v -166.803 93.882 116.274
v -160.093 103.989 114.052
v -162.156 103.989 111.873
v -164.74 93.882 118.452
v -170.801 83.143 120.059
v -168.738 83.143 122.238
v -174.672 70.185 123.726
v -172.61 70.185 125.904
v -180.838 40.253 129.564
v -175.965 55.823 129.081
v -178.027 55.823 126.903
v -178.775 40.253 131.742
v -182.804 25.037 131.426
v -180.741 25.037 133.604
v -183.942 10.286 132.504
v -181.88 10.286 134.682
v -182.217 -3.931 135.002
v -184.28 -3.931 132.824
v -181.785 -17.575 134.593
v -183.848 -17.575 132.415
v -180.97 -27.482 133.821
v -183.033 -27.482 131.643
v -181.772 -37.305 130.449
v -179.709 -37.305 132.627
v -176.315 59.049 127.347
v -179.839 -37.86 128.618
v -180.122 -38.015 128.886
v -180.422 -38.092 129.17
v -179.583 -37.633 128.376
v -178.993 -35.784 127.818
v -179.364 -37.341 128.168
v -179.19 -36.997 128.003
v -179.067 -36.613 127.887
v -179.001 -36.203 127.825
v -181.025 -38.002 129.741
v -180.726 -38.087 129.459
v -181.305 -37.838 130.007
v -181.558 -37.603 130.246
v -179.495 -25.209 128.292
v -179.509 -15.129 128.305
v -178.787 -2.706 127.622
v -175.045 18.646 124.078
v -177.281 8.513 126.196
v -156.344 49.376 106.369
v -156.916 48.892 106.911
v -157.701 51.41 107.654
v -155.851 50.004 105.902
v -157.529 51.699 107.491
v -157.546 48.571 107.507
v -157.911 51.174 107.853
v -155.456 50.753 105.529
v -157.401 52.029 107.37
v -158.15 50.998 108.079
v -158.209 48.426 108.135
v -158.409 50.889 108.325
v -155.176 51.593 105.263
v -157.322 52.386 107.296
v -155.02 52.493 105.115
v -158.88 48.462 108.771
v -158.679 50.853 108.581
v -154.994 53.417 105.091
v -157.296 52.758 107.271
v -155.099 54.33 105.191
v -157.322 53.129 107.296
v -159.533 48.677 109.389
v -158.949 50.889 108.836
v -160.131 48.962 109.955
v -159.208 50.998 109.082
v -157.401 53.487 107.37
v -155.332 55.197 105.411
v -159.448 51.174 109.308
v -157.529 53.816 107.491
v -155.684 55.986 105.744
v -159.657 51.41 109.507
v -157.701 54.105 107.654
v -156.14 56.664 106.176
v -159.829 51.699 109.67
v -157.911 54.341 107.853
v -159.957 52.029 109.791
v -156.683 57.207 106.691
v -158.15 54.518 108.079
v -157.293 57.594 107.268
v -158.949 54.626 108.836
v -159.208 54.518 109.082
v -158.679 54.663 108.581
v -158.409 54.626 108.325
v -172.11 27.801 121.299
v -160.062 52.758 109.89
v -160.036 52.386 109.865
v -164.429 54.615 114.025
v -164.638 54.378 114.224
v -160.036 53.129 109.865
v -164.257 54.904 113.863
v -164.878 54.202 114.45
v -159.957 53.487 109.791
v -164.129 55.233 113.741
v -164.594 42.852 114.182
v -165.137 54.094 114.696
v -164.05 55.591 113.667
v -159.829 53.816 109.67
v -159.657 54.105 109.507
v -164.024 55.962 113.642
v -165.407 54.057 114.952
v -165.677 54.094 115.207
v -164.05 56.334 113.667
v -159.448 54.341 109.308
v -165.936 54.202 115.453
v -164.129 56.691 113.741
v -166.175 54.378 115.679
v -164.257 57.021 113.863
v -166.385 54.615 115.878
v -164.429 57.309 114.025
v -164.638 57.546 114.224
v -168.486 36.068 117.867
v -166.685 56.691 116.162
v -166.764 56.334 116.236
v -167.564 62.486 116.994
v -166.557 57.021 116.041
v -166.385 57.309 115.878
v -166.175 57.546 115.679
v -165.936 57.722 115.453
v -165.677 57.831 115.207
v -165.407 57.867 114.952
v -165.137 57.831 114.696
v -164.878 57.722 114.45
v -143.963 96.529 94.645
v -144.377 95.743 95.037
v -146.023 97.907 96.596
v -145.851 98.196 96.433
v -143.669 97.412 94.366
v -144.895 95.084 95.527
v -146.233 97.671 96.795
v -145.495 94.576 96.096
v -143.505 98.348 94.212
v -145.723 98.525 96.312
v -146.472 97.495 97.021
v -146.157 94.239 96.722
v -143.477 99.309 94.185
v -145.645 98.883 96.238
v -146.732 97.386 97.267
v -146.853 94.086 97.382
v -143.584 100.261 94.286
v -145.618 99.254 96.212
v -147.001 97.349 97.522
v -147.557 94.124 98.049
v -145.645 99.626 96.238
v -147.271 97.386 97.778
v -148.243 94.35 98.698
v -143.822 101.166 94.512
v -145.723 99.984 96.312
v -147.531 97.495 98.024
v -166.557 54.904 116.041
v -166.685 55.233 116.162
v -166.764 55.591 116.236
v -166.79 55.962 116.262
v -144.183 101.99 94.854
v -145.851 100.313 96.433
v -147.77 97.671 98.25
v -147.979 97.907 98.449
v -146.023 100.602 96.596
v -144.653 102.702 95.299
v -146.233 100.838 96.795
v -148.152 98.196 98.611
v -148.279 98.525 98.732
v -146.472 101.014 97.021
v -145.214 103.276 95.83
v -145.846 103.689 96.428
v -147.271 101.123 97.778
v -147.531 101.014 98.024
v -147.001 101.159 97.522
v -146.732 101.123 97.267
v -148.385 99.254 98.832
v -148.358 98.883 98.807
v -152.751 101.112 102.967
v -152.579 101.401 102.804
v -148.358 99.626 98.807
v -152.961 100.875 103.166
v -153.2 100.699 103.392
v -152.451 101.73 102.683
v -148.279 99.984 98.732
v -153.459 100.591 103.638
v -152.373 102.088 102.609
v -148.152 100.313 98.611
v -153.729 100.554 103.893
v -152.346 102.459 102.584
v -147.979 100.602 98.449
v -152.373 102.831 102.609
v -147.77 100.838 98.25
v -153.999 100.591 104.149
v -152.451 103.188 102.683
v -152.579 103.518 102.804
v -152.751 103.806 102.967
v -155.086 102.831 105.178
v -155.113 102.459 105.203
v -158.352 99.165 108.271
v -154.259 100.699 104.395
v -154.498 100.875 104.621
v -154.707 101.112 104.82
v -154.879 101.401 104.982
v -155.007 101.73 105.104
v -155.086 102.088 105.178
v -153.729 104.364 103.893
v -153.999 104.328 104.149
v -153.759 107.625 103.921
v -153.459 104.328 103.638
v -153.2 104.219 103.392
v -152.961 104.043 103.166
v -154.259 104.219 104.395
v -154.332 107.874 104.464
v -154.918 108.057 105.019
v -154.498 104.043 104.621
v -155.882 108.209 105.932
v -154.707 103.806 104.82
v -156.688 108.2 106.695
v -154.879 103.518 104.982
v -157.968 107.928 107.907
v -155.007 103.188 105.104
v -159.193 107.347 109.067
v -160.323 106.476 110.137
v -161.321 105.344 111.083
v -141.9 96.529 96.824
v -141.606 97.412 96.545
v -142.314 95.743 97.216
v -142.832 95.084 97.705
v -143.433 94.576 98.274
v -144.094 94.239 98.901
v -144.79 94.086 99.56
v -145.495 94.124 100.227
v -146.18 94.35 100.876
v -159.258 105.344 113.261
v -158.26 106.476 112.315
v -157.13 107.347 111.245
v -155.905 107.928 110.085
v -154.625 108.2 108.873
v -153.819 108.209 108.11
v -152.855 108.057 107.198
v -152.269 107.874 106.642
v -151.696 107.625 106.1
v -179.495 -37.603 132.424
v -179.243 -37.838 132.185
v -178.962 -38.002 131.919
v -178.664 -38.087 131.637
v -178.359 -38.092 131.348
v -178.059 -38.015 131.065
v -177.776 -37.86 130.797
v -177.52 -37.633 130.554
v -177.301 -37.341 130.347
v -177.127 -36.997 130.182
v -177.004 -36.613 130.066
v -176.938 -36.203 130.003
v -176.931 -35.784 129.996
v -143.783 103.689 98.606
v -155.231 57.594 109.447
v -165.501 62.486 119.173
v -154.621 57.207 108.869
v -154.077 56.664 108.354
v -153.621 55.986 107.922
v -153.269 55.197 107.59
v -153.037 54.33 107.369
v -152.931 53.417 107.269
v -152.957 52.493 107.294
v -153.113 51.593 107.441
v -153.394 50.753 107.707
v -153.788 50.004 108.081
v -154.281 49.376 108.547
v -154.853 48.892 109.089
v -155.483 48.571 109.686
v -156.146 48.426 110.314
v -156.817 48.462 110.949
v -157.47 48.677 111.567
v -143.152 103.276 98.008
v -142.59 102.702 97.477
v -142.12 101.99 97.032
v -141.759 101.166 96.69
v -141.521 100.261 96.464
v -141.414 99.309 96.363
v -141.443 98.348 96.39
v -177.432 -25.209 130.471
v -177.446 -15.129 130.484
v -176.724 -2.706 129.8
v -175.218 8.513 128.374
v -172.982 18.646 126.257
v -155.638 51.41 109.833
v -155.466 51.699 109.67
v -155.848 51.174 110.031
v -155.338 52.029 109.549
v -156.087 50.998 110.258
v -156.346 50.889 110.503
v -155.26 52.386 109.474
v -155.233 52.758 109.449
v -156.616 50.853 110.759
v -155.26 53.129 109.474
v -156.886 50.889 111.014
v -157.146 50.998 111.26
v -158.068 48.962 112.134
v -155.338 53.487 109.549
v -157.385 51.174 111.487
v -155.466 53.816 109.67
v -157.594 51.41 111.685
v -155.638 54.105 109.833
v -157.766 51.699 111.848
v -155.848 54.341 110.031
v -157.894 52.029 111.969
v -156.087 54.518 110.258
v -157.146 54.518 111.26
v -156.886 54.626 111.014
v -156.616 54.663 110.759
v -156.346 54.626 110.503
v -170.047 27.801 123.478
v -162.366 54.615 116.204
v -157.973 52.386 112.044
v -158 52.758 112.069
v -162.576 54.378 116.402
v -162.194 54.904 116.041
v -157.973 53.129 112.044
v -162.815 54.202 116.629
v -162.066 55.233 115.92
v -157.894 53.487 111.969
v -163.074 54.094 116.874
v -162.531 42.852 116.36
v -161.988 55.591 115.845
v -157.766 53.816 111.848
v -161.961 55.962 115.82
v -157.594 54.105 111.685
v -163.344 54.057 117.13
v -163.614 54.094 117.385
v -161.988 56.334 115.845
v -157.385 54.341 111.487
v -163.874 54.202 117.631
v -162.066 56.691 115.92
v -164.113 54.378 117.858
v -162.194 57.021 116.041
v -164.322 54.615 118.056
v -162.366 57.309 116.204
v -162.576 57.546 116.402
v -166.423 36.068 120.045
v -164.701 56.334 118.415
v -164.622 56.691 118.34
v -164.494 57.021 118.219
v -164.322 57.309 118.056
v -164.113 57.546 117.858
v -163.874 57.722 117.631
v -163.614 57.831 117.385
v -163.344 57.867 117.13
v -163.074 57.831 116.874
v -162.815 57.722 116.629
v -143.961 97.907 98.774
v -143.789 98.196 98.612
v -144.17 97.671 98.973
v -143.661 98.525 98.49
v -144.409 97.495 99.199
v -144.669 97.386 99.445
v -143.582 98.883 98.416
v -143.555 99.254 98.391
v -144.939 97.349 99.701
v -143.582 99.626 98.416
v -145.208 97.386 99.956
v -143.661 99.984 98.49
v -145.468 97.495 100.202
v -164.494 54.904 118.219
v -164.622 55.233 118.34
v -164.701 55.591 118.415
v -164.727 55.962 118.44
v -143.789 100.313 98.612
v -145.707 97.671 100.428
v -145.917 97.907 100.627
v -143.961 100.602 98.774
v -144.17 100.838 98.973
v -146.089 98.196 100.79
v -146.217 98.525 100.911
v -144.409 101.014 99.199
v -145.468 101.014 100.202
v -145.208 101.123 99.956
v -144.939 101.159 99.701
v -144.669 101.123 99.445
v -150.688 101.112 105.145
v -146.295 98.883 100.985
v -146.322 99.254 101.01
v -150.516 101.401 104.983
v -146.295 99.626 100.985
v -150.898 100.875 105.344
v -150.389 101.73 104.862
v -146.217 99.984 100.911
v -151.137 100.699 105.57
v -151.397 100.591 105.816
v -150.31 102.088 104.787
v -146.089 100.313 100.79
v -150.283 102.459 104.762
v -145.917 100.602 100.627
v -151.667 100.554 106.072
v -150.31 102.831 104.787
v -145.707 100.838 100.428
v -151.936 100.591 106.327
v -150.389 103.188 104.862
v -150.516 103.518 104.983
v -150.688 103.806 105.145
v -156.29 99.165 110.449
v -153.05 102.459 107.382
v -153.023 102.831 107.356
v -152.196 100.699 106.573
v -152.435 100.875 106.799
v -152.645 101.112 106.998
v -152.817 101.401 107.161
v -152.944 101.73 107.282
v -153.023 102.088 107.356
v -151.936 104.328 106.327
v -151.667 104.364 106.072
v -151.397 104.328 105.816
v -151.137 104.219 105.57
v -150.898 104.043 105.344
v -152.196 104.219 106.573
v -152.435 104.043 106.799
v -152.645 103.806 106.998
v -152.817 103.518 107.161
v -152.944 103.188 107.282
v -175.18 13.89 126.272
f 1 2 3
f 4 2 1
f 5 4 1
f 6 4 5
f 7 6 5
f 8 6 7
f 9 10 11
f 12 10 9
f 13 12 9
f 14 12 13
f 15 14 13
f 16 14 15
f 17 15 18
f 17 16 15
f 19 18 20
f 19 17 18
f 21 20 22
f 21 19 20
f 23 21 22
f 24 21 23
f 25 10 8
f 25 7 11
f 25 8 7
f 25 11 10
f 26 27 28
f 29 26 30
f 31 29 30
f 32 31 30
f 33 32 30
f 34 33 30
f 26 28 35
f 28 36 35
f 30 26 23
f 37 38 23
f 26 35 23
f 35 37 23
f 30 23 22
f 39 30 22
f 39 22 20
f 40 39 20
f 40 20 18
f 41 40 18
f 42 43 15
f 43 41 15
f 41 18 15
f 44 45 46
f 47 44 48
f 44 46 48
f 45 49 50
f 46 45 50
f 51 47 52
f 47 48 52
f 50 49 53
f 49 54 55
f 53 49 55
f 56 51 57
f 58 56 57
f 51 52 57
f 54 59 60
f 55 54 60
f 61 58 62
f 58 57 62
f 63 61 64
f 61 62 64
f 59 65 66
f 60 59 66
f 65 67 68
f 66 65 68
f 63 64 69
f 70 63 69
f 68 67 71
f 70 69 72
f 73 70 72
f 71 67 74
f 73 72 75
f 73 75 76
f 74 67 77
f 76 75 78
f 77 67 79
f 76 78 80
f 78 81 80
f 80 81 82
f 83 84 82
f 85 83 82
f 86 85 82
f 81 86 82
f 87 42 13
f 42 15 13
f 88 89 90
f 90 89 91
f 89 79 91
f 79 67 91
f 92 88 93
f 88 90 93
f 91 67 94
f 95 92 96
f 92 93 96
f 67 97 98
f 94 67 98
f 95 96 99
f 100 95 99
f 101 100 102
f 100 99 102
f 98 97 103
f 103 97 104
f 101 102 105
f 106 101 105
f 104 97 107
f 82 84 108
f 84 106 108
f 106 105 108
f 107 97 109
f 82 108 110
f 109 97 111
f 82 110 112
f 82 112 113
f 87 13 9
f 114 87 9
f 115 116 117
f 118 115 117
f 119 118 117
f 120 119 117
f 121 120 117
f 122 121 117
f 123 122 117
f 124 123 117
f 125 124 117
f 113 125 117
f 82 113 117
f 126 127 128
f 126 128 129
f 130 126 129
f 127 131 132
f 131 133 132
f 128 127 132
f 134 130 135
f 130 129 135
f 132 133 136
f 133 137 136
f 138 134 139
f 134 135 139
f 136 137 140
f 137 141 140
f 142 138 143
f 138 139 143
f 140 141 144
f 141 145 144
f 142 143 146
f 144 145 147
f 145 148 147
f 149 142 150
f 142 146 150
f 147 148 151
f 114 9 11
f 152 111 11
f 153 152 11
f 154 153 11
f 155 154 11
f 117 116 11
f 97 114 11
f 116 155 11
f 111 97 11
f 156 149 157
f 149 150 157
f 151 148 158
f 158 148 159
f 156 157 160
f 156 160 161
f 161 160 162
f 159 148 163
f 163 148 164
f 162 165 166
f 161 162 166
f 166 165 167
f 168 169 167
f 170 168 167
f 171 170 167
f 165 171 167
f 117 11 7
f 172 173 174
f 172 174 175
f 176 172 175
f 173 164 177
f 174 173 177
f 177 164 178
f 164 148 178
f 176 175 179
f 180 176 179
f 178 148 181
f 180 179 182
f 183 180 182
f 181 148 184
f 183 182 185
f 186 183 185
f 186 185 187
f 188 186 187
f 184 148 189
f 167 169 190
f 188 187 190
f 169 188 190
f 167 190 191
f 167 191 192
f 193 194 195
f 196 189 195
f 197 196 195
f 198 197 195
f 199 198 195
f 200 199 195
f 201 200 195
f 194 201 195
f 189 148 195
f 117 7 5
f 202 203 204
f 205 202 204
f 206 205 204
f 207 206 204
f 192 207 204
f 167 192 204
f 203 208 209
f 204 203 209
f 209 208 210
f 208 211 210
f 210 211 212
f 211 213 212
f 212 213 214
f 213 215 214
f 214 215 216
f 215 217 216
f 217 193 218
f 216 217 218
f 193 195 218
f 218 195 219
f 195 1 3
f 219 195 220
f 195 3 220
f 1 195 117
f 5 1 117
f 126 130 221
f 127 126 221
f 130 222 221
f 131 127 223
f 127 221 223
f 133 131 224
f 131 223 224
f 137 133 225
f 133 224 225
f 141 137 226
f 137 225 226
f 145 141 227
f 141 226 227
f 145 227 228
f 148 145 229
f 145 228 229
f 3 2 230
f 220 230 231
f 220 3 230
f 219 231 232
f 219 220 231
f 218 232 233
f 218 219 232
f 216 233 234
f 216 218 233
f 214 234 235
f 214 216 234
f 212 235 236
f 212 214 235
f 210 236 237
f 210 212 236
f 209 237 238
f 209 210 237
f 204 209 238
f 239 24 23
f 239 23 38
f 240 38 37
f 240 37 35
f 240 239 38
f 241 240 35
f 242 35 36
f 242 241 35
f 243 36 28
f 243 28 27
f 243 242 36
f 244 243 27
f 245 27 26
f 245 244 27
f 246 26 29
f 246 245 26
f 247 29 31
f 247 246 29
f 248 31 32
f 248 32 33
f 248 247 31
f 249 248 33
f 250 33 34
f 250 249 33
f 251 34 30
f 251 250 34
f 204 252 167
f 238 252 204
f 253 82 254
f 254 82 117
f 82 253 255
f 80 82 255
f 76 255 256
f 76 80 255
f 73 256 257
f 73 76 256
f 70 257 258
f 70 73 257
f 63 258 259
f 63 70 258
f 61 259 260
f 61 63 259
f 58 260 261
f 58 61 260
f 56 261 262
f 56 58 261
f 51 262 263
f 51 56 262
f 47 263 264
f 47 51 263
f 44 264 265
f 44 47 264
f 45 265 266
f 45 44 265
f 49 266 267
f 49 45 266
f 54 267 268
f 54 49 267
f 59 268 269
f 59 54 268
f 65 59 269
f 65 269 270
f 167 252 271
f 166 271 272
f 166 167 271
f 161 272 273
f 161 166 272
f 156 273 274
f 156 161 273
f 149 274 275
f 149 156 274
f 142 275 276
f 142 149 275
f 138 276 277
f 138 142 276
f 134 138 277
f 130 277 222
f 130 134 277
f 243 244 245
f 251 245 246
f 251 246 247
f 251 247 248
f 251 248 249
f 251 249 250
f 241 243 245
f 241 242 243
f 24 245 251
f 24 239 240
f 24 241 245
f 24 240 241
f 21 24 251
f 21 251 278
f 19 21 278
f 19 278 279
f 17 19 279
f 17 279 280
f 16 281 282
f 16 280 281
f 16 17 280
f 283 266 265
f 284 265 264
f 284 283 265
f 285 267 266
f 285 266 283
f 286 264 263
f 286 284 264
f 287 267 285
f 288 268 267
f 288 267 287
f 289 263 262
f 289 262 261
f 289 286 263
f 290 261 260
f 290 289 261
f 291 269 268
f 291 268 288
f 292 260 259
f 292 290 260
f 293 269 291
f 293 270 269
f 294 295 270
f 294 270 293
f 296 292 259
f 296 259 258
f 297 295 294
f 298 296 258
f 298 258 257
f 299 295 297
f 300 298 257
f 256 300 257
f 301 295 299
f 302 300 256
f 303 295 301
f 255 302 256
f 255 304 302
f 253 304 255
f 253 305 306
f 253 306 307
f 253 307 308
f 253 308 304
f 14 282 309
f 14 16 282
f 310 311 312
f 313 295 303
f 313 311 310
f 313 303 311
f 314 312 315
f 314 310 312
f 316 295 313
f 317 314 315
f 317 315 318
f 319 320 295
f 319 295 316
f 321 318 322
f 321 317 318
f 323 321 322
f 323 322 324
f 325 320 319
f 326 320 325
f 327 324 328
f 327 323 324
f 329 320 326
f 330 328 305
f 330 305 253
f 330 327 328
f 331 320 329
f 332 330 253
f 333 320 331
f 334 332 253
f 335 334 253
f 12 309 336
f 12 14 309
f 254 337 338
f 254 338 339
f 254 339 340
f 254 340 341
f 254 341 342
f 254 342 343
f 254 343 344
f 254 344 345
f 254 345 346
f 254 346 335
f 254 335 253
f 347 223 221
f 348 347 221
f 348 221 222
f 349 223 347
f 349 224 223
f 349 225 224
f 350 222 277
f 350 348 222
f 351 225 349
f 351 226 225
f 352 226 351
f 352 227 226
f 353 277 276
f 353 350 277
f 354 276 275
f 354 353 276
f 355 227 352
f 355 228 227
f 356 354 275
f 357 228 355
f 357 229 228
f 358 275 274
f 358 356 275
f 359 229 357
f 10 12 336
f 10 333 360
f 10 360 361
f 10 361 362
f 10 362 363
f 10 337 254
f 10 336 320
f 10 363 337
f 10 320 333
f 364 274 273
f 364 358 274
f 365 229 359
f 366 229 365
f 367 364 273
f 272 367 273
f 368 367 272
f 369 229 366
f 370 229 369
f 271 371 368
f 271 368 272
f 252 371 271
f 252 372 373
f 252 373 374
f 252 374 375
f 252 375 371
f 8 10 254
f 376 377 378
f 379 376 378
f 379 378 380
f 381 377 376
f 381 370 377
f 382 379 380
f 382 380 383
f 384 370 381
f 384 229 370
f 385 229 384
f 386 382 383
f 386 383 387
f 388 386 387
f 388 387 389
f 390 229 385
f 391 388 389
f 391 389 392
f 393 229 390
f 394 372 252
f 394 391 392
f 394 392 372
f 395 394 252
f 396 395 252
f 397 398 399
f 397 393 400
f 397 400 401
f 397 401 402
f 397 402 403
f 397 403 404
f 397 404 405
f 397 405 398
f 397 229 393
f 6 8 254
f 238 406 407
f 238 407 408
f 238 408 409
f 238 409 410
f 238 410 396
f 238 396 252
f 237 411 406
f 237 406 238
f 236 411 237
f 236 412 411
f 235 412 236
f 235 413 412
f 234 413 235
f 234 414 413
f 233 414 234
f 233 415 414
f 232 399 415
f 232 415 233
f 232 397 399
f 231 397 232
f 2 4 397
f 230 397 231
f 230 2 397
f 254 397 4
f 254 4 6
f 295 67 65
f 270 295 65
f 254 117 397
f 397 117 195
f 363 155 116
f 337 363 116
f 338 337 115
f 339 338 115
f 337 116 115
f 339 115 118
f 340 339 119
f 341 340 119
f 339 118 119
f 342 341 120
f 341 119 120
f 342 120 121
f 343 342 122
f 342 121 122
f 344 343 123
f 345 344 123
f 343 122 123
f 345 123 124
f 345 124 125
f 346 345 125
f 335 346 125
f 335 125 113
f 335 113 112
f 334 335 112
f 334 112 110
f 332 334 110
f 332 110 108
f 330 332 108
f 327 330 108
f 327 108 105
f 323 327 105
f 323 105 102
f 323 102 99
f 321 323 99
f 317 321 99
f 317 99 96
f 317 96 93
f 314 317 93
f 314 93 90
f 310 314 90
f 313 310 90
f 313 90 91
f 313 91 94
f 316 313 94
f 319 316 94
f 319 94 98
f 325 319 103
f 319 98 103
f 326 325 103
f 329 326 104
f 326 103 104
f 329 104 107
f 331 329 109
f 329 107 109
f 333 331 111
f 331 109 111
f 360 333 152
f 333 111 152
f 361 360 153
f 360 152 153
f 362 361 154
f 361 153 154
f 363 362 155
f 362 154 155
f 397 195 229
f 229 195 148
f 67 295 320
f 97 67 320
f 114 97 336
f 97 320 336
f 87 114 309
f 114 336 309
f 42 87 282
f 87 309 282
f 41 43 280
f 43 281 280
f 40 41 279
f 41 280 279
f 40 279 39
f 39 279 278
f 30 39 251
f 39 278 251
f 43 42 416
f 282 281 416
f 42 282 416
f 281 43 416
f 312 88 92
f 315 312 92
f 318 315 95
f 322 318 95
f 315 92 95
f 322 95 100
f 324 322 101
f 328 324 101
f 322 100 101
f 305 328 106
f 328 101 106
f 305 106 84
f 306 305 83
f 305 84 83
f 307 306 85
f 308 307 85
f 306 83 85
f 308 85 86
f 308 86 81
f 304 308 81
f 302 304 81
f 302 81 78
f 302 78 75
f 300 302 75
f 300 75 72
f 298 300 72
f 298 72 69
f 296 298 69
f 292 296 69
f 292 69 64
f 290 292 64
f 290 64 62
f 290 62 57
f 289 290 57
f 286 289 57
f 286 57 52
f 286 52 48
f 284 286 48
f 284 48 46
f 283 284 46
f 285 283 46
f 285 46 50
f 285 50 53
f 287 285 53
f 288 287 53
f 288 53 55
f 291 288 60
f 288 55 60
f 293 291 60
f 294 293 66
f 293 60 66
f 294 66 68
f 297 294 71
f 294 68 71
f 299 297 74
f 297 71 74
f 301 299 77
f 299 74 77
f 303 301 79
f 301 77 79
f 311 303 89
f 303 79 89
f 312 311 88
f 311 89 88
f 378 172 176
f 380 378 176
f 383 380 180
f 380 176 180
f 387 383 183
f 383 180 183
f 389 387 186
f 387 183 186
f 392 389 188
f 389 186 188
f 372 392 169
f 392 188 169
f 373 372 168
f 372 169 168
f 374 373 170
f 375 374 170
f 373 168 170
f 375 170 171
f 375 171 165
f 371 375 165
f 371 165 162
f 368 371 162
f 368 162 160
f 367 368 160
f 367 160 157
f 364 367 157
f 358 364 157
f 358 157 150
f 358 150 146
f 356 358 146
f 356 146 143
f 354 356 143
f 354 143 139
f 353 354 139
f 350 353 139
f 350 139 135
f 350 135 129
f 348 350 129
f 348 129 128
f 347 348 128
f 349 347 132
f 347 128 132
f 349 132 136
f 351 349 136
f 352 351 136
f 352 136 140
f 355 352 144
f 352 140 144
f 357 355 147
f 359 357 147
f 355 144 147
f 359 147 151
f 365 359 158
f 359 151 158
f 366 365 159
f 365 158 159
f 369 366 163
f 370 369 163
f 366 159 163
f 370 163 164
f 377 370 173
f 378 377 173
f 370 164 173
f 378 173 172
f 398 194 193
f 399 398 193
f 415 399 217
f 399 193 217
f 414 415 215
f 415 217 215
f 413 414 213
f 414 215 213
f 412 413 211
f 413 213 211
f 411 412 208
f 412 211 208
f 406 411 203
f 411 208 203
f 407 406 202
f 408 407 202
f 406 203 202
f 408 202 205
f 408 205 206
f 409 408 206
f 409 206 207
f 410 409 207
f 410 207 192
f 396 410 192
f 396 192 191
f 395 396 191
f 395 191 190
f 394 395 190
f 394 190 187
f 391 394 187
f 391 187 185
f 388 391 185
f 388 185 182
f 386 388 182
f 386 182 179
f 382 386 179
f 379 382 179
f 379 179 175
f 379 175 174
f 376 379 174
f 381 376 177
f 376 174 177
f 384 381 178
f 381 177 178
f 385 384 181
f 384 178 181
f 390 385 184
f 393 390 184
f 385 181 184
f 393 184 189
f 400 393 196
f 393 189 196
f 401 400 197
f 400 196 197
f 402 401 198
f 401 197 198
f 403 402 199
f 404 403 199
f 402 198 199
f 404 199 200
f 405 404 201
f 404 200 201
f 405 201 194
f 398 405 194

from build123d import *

# Parameters (mm, degrees)
BOSS_EXTRUDE1_DEPTH        = 3
CUT_EXTRUDE1_DEPTH         = 252.974914731
M3_5_CLEARANCE_HOLE1_D     = 3.81
M3_5_CLEARANCE_HOLE1_DEPTH = 33.326039541
FILLET3_R                  = 10
FILLET4_R                  = 4.953107
FILLET10_RADIUS            = 4.717615086
FILLET10_LENGTH            = 3


with BuildPart() as part:
    # Sketch1 → Boss-Extrude1 (new body)
    with BuildSketch(Plane(origin=(-18.747425911, 0, -19.797474517), x_dir=(0, 1, 0), z_dir=(0.6875885279992334, -2.359310851515896e-15, 0.7261005551325845))):
        with BuildLine():
            Line((47.134672347, 186.593127271), (102.029433509, 167.605742926))
            Line((102.029433509, 167.605742926), (110.11778873, 189.999917885))
            add(Edge.make_bspline(
                [(110.11778873, 189.999917885), (95.556778138, 201.958306819), (77.203961524, 210.173231356), (27.942477706, 224.856027605), (-5.55144569, 228.347913352), (-37.305127188, 221.679998311)],
                knots=[0.208168369, 0.208168369, 0.208168369, 0.208168369, 0.5, 0.5, 1, 1, 1, 1], degree=3))
            ThreePointArc((-37.305127188, 221.679998311), (-37.947282057, 219.208911383), (-35.783847857, 217.85311422))
            add(Edge.make_bspline(
                [(48.961630736, 191.875078834), (21.255996477, 223.260445978), (-35.783847857, 217.85311422)],
                knots=[3.106185015, 3.106185015, 3.106185015, 3.3708584, 3.3708584, 3.3708584], degree=2, weights=[1, 0.991256272, 1]))
            Line((48.961630736, 191.875078834), (47.134672347, 186.593127271))
        make_face()
    extrude(amount=-BOSS_EXTRUDE1_DEPTH)

    # Sketch2 → Cut-Extrude1 (cut, through all)
    with BuildSketch(Plane(origin=(-20.810191495, 0, -21.975776182), x_dir=(-0.7261005551325845, -2.234174129215775e-15, 0.6875885279992334), z_dir=(-0.6875885279992334, 2.3593108515158963e-15, -0.7261005551325845))):
        Polygon((170.822075884, 92.730636669), (183.50888872, 56.051568722), (202.112473576, 62.486306908), (189.42566074, 99.165374855), align=None)
    extrude(amount=-CUT_EXTRUDE1_DEPTH, mode=Mode.SUBTRACT)

    # M3.5 Clearance Hole1
    with Locations(Plane(origin=(-18.747425911, 0, -19.797474517), x_dir=(0.7261005551325845, 2.234174129215775e-15, -0.6875885279992334), z_dir=(0.6875885279992334, -2.3593108515158963e-15, 0.7261005551325845))):
        with Locations((-183.058820464, 102.459409082), (-199.141514485, 55.962449256), (-189.875728995, 52.757534495), (-173.793034975, 99.254494321)):
            Hole(M3_5_CLEARANCE_HOLE1_D / 2, depth=M3_5_CLEARANCE_HOLE1_DEPTH)

    # Fillet3
    fillet3_edges = [part.edges().sort_by_distance(p)[0] for p in [
        (-157.737854554, 110.11778873, 109.755138509),
    ]]
    fillet(fillet3_edges, radius=FILLET3_R)

    # Fillet4
    fillet4_edges = [part.edges().sort_by_distance(p)[0] for p in [
        (-141.477431685, 102.029433509, 94.357160713),
        (-143.812812831, 92.730636669, 96.568674357),
    ]]
    fillet(fillet4_edges, radius=FILLET4_R - 0.0001)  # a hair under: the kernel refuses the full size

    # Fillet10: full round fillet: the end face becomes a half cylinder, R = half its width
    fillet10_face = Plane((-154.144448336, 51.593120535, 106.352324843), x_dir=(-0.687588527999, 0, -0.726100555133), z_dir=(0.686211495613, -0.326885353607, -0.649815165171))  # on the end face: x along it, z out of the body
    fillet10_slab = fillet10_face.offset(-FILLET10_RADIUS / 2) * Box(FILLET10_LENGTH, 2 * FILLET10_RADIUS, FILLET10_RADIUS, mode=Mode.PRIVATE)  # the body's end, R deep
    fillet10_round = Plane((-157.38173004, 53.135239811, 109.417902669), x_dir=(0.686211495613, -0.326885353607, -0.649815165171), z_dir=(-0.687588527999, 0, -0.726100555133)) * Cylinder(FILLET10_RADIUS, FILLET10_LENGTH, mode=Mode.PRIVATE)  # its axis R under the face
    add(fillet10_slab - fillet10_round, mode=Mode.SUBTRACT)


solid = part.part
